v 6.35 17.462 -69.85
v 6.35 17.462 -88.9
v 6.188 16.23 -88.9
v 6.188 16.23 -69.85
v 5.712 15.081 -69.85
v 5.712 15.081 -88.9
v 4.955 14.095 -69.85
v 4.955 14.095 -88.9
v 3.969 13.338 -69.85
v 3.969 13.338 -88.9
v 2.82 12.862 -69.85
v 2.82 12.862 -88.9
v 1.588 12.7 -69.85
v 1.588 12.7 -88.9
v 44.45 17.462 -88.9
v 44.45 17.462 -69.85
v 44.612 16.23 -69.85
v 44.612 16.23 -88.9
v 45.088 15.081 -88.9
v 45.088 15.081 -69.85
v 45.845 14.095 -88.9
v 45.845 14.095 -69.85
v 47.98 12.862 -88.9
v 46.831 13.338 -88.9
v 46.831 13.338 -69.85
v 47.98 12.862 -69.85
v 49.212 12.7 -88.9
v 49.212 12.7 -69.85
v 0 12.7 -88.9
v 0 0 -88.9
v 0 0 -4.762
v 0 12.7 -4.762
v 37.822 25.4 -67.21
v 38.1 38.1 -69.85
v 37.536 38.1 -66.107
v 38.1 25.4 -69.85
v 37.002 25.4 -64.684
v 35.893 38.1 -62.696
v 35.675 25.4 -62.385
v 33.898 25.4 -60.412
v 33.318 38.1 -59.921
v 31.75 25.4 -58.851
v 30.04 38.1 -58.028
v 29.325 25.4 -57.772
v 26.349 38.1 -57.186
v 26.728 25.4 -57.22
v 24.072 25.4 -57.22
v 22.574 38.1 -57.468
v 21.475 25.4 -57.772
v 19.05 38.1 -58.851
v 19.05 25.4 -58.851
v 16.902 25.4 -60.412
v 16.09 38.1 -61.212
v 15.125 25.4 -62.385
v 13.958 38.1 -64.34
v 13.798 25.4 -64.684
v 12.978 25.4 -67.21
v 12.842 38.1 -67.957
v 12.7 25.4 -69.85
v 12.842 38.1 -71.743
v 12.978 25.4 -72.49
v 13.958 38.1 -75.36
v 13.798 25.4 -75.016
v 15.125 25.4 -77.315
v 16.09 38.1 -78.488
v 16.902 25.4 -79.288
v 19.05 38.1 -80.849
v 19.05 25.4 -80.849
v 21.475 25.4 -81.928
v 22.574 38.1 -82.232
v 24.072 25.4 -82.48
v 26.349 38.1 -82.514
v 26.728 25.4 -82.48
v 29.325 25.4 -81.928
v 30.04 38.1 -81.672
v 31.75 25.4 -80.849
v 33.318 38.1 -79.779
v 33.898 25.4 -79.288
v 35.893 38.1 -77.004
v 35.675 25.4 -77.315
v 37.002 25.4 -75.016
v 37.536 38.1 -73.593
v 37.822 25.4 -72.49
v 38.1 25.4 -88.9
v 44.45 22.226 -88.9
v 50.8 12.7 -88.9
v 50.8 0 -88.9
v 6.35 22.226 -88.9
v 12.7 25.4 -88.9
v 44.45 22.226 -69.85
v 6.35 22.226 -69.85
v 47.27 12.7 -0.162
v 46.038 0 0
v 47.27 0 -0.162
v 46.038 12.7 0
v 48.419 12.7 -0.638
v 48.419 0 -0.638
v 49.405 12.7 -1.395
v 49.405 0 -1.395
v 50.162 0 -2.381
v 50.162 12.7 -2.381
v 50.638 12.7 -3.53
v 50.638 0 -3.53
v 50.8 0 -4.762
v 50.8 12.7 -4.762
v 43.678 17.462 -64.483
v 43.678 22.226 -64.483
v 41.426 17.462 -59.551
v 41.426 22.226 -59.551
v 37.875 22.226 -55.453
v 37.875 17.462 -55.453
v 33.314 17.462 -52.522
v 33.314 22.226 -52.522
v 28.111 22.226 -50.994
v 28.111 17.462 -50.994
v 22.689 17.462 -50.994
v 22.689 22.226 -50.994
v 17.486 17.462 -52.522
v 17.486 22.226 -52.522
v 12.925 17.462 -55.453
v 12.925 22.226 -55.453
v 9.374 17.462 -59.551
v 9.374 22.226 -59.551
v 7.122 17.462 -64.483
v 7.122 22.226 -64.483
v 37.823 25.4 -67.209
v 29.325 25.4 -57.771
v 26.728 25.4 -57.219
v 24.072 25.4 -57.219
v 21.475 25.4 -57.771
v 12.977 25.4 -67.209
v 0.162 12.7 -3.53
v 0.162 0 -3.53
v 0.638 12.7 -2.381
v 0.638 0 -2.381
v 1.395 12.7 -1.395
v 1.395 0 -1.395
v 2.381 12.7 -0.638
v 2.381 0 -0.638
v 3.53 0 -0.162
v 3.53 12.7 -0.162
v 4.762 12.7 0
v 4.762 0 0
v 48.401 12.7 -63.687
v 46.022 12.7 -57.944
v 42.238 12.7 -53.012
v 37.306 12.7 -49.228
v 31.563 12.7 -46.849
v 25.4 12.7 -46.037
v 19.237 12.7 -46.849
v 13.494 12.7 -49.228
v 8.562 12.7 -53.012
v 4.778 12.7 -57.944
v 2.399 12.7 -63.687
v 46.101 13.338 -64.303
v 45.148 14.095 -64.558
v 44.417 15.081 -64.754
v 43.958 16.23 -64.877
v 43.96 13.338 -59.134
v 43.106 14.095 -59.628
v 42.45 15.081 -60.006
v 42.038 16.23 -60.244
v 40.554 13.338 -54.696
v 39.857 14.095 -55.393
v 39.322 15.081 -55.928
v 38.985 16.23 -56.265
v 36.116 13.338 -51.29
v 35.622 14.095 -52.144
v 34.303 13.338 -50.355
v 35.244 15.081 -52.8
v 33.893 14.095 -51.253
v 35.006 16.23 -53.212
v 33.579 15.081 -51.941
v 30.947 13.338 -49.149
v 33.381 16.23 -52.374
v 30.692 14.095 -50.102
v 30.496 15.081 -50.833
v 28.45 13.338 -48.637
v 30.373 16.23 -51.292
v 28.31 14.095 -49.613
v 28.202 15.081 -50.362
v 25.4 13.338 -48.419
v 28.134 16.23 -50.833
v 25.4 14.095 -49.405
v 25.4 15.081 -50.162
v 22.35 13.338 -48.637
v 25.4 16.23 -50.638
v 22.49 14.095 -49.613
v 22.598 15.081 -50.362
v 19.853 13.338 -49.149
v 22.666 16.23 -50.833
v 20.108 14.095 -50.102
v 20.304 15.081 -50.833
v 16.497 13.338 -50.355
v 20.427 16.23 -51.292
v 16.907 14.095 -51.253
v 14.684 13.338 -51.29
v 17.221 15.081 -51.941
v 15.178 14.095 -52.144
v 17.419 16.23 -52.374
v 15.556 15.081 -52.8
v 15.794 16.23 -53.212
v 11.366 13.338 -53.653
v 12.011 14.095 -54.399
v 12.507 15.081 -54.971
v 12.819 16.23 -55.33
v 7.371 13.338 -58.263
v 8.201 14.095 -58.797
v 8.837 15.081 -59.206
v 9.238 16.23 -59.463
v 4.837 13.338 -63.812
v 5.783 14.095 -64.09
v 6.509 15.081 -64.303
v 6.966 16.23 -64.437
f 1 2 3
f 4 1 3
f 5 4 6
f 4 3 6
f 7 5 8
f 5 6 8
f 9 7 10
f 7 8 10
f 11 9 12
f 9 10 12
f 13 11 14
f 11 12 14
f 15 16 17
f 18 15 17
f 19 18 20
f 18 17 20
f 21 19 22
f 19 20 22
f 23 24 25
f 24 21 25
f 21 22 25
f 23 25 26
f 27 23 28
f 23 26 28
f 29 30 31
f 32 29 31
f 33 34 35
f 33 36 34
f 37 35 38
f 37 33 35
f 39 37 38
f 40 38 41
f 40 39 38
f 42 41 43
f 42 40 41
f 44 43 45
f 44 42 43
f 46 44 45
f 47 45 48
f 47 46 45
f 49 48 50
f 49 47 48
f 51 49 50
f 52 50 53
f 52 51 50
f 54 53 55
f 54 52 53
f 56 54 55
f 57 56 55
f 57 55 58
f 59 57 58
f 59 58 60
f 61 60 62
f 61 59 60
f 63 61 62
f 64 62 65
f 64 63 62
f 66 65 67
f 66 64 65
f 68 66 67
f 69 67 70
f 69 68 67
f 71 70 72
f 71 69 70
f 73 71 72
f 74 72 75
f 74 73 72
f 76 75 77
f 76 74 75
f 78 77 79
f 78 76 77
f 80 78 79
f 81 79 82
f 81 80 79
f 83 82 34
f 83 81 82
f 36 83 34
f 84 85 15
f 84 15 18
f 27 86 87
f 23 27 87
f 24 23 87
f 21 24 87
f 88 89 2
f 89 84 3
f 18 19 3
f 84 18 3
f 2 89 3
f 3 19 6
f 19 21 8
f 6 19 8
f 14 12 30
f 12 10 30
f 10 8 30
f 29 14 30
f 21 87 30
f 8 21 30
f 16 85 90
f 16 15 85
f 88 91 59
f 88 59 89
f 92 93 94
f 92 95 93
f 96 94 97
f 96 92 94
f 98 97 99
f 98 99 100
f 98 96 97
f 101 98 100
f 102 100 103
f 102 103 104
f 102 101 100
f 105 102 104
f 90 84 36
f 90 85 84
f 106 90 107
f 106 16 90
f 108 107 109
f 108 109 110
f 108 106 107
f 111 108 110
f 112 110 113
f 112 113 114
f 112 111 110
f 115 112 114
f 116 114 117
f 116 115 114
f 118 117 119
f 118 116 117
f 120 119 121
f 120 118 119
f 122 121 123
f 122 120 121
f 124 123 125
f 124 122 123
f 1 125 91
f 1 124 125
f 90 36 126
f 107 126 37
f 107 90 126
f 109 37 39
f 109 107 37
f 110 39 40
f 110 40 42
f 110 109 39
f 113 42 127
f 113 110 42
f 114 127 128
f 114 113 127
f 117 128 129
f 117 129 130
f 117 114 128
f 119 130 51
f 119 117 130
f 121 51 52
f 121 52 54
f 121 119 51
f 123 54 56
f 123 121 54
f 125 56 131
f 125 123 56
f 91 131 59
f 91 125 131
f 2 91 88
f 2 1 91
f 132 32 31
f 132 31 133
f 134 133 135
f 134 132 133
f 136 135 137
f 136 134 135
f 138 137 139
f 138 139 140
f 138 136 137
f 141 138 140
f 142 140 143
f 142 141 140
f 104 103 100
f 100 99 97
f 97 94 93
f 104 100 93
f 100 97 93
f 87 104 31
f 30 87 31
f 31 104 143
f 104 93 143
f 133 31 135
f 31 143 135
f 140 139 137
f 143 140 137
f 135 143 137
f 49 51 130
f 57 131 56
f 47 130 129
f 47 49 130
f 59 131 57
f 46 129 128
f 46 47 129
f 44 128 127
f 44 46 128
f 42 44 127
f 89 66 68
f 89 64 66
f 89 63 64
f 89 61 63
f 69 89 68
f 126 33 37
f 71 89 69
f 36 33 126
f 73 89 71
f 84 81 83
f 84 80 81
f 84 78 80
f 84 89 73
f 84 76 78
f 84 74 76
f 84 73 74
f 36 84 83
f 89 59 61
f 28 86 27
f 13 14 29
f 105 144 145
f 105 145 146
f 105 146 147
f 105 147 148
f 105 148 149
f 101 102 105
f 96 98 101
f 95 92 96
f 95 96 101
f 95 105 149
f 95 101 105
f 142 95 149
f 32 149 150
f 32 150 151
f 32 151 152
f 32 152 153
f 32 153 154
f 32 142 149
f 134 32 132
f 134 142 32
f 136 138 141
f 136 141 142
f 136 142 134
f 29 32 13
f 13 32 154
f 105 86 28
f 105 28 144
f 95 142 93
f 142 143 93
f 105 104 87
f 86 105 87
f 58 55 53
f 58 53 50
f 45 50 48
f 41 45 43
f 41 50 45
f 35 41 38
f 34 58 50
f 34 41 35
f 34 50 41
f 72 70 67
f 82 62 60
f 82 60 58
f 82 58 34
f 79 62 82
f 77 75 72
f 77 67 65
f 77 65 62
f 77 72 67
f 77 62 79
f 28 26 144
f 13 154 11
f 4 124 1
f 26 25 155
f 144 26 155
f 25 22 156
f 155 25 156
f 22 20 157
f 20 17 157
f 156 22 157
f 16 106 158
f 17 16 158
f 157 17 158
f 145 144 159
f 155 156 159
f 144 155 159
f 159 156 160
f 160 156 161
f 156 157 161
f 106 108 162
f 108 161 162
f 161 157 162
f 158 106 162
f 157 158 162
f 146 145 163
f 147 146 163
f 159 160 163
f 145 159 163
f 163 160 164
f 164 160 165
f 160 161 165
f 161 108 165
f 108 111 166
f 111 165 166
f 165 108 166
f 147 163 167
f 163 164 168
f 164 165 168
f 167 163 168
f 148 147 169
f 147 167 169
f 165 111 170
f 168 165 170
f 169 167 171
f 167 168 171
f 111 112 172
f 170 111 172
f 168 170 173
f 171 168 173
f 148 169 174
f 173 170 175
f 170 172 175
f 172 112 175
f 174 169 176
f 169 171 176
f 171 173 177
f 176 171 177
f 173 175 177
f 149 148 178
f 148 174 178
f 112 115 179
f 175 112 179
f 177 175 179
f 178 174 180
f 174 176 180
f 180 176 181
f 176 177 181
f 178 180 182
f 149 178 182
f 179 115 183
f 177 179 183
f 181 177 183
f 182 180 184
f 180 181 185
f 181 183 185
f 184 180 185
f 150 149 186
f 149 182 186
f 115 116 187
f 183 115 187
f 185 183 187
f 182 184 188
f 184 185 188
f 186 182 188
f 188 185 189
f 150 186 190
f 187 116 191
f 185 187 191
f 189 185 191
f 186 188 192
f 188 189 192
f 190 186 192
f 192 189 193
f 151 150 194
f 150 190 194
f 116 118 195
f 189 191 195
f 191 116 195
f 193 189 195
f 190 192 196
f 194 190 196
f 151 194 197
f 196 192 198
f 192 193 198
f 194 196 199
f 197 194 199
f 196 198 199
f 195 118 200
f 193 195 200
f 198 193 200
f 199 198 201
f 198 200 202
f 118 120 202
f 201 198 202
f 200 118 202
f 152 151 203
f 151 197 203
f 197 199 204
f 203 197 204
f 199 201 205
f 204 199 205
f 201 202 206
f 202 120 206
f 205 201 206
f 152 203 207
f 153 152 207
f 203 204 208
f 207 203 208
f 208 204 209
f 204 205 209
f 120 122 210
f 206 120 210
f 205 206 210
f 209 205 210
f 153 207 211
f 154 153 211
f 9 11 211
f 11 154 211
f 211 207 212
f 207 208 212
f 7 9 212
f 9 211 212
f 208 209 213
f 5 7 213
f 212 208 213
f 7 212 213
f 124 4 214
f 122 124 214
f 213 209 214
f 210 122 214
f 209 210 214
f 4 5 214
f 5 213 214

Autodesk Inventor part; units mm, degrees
ref_plane "YZ Plane" through (0, 0, 0) normal (1, 0, 0) x (0, 1, 0)
ref_plane "XZ Plane" through (0, 0, 0) normal (0, 1, 0) x (-1, 0, 0)
ref_plane "XY Plane" through (0, 0, 0) normal (0, 0, 1) x (1, 0, 0)
sketch "Sketch1" plane through (0, 0, 0) normal (0, 1, 0) x (-1, 0, 0)
  line L0 (0, 0) -> (-50.8, 0)
  line L1 (-50.8, 0) -> (-50.8, -88.9)
  line L2 (-50.8, -88.9) -> (0, -88.9)
  line L3 (0, -88.9) -> (0, 0)
  dimension "d0" = 50.8
  dimension "d1" = 88.9
extrude "Extrusion1" add sketch "Sketch1" along normal blind 12.7
sketch "Sketch2" plane through (0, 12.7, 0) normal (0, 1, 0) x (1, 0, 0)
  line L0 (50.8, 0) -> (50.8, 88.9) projected
  line L1 (50.8, 88.9) -> (0, 88.9) projected
  line L2 (0, 88.9) -> (0, 0) projected
  line L3 (6.35, 88.9) -> (44.45, 88.9)
  line L4 (44.45, 88.9) -> (44.45, 69.85)
  line L5 (44.45, 69.85) -> (6.35, 69.85)
  line L6 (6.35, 69.85) -> (6.35, 88.9)
  line L7 (6.35, 79.375) -> (0, 79.375) construction
  line L8 (44.45, 79.375) -> (50.8, 79.375) construction
  circle A0 centre (25.4, 69.85) radius 19.05
  dimension "d4" = 19.05
  dimension "d5" = 6.35
extrude "Extrusion2" add sketch "Sketch2" along normal blind 12.7
sketch "Sketch3" plane through (0, 25.4, 0) normal (0, 1, 0) x (1, 0, 0)
  arc A0 (6.35, 69.85) -> (44.45, 69.85) centre (25.4, 69.85) ccw projected
  circle A1 centre (25.4, 69.85) radius 12.7
  point P0 (0, 0)
  dimension "d8" = 25.4
extrude "Extrusion3" add sketch "Sketch3" along normal blind 12.7
fillet "Fillet2" radius 4.7625 5 edges at (50.8, 6.35, 0) (0, 6.35, 0) (6.35, 12.7, -79.375) (44.45, 12.7, -79.375) (25.4, 12.7, -50.8)
chamfer "Chamfer1" distance 6.35 distance2 3.175 3 edges at (44.45, 25.4, -79.375) (25.4, 25.4, -50.8) (6.35, 25.4, -79.375) measured on face at (24.8897, 25.4, -86.7525)
properties part number "Fillet Chamfer Complete"
